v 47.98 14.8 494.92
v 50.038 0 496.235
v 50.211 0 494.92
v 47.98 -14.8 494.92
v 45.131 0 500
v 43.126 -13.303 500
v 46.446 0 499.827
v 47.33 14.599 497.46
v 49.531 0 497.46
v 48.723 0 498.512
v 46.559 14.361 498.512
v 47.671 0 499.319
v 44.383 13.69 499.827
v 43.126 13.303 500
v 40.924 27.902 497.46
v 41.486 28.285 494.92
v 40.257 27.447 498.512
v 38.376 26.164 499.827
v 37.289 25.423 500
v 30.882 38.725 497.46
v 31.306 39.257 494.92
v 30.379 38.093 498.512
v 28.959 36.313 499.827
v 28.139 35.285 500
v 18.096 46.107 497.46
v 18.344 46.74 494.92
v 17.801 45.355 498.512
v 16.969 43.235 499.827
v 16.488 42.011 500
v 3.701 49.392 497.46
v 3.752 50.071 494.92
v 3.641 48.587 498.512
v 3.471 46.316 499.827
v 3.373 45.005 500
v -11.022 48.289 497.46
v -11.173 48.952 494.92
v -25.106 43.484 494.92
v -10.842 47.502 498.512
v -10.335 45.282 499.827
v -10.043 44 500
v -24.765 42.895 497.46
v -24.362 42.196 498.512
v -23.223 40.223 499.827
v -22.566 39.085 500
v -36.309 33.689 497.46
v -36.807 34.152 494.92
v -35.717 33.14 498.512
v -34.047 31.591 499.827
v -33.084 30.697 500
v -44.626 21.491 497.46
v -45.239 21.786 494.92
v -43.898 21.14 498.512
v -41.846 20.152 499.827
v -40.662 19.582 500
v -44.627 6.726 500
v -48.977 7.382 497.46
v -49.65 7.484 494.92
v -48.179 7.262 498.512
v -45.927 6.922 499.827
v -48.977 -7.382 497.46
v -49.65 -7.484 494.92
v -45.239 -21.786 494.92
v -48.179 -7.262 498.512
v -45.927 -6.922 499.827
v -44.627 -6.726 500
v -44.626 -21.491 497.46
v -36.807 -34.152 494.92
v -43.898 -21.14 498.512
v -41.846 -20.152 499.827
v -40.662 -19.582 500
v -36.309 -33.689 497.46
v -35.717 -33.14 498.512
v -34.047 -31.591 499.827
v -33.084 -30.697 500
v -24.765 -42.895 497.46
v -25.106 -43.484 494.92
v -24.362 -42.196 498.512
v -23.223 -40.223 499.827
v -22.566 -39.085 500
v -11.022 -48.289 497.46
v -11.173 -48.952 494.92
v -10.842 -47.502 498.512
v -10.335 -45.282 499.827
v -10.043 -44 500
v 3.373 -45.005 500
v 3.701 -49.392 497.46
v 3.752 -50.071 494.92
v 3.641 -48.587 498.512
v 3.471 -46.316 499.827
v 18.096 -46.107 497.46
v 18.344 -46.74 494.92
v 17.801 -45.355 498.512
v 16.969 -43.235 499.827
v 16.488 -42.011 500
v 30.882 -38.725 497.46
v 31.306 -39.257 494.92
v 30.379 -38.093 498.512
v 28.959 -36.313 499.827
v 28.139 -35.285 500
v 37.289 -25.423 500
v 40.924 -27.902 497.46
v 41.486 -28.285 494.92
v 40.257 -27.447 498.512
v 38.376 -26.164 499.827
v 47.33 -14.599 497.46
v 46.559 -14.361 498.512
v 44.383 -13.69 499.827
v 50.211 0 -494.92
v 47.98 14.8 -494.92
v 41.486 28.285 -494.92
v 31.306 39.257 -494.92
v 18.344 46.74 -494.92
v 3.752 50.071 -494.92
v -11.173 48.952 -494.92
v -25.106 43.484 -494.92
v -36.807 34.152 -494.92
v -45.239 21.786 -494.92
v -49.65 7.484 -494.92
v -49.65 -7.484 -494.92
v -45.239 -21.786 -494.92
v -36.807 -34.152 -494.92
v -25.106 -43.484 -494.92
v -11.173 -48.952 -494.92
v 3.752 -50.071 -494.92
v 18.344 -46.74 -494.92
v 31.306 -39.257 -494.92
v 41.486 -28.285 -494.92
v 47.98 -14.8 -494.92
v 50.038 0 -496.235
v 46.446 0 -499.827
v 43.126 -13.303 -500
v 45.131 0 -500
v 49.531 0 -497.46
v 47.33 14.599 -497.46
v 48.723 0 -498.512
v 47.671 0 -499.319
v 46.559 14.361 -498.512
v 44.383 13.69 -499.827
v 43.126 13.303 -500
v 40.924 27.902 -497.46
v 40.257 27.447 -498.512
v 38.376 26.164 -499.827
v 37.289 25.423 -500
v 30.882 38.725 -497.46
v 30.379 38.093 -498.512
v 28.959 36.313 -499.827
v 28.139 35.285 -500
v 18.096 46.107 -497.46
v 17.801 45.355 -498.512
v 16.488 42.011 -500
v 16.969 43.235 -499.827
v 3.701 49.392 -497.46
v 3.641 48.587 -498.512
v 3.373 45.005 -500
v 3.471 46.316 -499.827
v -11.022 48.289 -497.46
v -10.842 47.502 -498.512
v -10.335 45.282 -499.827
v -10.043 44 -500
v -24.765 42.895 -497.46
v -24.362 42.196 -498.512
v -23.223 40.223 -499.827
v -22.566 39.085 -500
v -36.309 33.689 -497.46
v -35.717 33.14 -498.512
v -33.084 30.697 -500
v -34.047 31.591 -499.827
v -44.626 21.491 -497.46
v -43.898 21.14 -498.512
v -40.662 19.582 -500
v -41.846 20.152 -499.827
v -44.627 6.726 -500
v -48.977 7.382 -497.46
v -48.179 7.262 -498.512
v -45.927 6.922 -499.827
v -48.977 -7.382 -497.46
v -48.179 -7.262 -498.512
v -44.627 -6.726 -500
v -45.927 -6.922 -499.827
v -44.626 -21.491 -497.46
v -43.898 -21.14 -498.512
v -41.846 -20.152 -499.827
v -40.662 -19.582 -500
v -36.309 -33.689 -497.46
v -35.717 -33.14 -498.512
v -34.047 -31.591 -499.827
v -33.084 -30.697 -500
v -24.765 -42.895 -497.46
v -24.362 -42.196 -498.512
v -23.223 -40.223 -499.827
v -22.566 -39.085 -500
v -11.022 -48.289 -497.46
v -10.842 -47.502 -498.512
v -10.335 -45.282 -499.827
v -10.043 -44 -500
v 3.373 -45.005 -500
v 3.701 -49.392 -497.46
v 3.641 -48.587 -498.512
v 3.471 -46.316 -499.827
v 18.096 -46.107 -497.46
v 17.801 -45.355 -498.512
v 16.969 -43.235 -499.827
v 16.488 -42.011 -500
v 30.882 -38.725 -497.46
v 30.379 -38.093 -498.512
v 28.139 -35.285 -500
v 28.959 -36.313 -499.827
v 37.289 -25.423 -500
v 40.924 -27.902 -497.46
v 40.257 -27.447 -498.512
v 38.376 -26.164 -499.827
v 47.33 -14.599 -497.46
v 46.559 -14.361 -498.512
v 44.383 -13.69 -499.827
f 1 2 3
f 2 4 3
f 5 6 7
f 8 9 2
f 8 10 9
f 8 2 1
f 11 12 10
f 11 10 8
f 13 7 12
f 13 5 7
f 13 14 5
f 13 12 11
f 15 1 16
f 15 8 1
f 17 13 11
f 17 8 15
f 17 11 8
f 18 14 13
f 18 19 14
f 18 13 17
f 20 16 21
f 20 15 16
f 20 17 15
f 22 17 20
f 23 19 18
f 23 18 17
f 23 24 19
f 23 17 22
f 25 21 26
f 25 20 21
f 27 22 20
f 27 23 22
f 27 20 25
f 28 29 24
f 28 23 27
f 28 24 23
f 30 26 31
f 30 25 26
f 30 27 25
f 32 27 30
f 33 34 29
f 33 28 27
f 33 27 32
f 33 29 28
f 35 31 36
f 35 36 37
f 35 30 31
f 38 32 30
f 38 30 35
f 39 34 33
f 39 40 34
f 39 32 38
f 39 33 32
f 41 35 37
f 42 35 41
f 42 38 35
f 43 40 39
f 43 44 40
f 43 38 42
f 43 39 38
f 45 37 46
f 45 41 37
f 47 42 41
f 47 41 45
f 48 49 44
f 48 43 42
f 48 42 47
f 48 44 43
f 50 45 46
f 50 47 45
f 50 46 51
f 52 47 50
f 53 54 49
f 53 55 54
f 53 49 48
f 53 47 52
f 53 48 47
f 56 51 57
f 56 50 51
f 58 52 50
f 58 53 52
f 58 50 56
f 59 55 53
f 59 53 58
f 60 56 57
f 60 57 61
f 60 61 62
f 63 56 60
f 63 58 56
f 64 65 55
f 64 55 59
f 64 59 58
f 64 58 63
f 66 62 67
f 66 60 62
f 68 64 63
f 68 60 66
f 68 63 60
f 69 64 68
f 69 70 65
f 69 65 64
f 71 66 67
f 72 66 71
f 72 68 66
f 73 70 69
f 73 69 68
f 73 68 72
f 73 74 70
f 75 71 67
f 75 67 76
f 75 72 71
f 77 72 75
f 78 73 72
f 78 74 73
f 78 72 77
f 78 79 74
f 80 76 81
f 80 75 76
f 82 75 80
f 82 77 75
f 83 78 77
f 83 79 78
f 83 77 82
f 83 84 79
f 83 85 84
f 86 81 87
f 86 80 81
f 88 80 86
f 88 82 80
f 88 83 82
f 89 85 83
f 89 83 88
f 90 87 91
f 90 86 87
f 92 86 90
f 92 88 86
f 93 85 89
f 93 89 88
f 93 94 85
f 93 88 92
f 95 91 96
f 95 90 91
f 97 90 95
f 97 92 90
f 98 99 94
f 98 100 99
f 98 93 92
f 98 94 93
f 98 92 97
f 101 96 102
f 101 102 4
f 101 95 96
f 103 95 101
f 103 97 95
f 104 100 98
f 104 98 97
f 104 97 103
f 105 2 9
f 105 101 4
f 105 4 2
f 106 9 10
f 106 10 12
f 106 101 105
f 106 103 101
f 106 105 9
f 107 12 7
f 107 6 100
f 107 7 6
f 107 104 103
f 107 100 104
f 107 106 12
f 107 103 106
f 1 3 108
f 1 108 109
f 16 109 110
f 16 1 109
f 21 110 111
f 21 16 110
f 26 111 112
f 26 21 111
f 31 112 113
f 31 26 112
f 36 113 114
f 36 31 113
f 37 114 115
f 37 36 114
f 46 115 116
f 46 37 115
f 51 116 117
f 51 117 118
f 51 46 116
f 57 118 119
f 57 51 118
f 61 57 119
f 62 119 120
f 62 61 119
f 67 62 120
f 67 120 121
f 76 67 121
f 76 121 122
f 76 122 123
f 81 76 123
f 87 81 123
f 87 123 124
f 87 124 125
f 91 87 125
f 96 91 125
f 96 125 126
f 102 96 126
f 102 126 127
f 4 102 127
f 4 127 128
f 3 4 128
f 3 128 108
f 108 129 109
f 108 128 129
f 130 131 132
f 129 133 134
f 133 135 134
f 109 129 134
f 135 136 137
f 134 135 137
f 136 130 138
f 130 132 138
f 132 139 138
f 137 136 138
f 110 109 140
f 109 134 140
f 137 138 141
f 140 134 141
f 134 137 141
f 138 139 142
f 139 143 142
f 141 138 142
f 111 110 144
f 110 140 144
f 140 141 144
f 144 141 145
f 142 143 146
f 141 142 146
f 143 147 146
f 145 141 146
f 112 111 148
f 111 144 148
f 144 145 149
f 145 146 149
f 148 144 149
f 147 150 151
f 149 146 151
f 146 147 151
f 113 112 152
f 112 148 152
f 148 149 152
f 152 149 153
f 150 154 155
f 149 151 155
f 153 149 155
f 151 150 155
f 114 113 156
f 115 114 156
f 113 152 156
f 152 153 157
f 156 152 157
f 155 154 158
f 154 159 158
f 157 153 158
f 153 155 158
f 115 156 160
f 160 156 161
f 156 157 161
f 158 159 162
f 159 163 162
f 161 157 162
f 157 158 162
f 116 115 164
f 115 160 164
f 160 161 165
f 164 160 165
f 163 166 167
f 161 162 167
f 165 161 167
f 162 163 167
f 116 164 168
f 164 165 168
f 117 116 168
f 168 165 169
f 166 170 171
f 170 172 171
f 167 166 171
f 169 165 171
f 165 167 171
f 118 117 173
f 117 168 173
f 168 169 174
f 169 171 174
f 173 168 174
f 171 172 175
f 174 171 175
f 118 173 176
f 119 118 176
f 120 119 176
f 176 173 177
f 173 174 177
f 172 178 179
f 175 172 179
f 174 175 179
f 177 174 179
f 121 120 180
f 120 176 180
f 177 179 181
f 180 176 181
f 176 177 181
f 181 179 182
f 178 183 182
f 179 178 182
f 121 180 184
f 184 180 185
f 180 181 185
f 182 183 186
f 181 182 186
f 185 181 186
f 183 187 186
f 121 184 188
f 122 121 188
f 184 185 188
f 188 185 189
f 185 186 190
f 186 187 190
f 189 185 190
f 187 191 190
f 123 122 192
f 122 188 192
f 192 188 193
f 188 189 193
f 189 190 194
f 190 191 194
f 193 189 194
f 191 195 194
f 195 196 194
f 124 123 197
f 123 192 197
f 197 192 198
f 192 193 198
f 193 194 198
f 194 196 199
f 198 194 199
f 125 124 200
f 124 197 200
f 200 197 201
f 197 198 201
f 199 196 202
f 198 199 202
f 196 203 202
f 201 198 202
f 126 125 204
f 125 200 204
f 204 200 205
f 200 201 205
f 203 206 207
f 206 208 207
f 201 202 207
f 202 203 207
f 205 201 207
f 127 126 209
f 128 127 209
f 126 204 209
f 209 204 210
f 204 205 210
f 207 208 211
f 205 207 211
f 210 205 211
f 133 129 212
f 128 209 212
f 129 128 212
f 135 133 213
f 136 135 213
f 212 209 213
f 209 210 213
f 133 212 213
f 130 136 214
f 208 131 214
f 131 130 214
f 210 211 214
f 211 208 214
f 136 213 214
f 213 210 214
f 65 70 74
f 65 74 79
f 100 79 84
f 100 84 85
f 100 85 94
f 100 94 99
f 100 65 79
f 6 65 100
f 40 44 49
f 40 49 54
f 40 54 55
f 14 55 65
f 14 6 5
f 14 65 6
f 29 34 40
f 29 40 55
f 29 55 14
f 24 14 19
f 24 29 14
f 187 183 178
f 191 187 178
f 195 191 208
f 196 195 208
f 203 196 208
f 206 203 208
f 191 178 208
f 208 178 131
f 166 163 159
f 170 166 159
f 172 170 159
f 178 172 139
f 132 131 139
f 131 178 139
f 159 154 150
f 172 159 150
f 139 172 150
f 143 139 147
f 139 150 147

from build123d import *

# Parameters (mm, degrees)
F0_R     = 50.211231
F1_DEPTH = 500
F2_R     = 5.08
F3_R     = 5.08


with BuildPart() as f1:
    # F0 (on Top) → F1 (new body, symmetric)
    with BuildSketch(Plane.XY):
        Circle(F0_R)
    extrude(amount=F1_DEPTH, both=True)

    # F2
    f2_edges = [f1.edges().sort_by_distance(p)[0] for p in [
        (-50.211231, 0, -500),
    ]]
    fillet(f2_edges, radius=F2_R)

    # F3
    f3_edges = [f1.edges().sort_by_distance(p)[0] for p in [
        (-50.211231, 0, 500),
    ]]
    fillet(f3_edges, radius=F3_R)


solid = f1.part
